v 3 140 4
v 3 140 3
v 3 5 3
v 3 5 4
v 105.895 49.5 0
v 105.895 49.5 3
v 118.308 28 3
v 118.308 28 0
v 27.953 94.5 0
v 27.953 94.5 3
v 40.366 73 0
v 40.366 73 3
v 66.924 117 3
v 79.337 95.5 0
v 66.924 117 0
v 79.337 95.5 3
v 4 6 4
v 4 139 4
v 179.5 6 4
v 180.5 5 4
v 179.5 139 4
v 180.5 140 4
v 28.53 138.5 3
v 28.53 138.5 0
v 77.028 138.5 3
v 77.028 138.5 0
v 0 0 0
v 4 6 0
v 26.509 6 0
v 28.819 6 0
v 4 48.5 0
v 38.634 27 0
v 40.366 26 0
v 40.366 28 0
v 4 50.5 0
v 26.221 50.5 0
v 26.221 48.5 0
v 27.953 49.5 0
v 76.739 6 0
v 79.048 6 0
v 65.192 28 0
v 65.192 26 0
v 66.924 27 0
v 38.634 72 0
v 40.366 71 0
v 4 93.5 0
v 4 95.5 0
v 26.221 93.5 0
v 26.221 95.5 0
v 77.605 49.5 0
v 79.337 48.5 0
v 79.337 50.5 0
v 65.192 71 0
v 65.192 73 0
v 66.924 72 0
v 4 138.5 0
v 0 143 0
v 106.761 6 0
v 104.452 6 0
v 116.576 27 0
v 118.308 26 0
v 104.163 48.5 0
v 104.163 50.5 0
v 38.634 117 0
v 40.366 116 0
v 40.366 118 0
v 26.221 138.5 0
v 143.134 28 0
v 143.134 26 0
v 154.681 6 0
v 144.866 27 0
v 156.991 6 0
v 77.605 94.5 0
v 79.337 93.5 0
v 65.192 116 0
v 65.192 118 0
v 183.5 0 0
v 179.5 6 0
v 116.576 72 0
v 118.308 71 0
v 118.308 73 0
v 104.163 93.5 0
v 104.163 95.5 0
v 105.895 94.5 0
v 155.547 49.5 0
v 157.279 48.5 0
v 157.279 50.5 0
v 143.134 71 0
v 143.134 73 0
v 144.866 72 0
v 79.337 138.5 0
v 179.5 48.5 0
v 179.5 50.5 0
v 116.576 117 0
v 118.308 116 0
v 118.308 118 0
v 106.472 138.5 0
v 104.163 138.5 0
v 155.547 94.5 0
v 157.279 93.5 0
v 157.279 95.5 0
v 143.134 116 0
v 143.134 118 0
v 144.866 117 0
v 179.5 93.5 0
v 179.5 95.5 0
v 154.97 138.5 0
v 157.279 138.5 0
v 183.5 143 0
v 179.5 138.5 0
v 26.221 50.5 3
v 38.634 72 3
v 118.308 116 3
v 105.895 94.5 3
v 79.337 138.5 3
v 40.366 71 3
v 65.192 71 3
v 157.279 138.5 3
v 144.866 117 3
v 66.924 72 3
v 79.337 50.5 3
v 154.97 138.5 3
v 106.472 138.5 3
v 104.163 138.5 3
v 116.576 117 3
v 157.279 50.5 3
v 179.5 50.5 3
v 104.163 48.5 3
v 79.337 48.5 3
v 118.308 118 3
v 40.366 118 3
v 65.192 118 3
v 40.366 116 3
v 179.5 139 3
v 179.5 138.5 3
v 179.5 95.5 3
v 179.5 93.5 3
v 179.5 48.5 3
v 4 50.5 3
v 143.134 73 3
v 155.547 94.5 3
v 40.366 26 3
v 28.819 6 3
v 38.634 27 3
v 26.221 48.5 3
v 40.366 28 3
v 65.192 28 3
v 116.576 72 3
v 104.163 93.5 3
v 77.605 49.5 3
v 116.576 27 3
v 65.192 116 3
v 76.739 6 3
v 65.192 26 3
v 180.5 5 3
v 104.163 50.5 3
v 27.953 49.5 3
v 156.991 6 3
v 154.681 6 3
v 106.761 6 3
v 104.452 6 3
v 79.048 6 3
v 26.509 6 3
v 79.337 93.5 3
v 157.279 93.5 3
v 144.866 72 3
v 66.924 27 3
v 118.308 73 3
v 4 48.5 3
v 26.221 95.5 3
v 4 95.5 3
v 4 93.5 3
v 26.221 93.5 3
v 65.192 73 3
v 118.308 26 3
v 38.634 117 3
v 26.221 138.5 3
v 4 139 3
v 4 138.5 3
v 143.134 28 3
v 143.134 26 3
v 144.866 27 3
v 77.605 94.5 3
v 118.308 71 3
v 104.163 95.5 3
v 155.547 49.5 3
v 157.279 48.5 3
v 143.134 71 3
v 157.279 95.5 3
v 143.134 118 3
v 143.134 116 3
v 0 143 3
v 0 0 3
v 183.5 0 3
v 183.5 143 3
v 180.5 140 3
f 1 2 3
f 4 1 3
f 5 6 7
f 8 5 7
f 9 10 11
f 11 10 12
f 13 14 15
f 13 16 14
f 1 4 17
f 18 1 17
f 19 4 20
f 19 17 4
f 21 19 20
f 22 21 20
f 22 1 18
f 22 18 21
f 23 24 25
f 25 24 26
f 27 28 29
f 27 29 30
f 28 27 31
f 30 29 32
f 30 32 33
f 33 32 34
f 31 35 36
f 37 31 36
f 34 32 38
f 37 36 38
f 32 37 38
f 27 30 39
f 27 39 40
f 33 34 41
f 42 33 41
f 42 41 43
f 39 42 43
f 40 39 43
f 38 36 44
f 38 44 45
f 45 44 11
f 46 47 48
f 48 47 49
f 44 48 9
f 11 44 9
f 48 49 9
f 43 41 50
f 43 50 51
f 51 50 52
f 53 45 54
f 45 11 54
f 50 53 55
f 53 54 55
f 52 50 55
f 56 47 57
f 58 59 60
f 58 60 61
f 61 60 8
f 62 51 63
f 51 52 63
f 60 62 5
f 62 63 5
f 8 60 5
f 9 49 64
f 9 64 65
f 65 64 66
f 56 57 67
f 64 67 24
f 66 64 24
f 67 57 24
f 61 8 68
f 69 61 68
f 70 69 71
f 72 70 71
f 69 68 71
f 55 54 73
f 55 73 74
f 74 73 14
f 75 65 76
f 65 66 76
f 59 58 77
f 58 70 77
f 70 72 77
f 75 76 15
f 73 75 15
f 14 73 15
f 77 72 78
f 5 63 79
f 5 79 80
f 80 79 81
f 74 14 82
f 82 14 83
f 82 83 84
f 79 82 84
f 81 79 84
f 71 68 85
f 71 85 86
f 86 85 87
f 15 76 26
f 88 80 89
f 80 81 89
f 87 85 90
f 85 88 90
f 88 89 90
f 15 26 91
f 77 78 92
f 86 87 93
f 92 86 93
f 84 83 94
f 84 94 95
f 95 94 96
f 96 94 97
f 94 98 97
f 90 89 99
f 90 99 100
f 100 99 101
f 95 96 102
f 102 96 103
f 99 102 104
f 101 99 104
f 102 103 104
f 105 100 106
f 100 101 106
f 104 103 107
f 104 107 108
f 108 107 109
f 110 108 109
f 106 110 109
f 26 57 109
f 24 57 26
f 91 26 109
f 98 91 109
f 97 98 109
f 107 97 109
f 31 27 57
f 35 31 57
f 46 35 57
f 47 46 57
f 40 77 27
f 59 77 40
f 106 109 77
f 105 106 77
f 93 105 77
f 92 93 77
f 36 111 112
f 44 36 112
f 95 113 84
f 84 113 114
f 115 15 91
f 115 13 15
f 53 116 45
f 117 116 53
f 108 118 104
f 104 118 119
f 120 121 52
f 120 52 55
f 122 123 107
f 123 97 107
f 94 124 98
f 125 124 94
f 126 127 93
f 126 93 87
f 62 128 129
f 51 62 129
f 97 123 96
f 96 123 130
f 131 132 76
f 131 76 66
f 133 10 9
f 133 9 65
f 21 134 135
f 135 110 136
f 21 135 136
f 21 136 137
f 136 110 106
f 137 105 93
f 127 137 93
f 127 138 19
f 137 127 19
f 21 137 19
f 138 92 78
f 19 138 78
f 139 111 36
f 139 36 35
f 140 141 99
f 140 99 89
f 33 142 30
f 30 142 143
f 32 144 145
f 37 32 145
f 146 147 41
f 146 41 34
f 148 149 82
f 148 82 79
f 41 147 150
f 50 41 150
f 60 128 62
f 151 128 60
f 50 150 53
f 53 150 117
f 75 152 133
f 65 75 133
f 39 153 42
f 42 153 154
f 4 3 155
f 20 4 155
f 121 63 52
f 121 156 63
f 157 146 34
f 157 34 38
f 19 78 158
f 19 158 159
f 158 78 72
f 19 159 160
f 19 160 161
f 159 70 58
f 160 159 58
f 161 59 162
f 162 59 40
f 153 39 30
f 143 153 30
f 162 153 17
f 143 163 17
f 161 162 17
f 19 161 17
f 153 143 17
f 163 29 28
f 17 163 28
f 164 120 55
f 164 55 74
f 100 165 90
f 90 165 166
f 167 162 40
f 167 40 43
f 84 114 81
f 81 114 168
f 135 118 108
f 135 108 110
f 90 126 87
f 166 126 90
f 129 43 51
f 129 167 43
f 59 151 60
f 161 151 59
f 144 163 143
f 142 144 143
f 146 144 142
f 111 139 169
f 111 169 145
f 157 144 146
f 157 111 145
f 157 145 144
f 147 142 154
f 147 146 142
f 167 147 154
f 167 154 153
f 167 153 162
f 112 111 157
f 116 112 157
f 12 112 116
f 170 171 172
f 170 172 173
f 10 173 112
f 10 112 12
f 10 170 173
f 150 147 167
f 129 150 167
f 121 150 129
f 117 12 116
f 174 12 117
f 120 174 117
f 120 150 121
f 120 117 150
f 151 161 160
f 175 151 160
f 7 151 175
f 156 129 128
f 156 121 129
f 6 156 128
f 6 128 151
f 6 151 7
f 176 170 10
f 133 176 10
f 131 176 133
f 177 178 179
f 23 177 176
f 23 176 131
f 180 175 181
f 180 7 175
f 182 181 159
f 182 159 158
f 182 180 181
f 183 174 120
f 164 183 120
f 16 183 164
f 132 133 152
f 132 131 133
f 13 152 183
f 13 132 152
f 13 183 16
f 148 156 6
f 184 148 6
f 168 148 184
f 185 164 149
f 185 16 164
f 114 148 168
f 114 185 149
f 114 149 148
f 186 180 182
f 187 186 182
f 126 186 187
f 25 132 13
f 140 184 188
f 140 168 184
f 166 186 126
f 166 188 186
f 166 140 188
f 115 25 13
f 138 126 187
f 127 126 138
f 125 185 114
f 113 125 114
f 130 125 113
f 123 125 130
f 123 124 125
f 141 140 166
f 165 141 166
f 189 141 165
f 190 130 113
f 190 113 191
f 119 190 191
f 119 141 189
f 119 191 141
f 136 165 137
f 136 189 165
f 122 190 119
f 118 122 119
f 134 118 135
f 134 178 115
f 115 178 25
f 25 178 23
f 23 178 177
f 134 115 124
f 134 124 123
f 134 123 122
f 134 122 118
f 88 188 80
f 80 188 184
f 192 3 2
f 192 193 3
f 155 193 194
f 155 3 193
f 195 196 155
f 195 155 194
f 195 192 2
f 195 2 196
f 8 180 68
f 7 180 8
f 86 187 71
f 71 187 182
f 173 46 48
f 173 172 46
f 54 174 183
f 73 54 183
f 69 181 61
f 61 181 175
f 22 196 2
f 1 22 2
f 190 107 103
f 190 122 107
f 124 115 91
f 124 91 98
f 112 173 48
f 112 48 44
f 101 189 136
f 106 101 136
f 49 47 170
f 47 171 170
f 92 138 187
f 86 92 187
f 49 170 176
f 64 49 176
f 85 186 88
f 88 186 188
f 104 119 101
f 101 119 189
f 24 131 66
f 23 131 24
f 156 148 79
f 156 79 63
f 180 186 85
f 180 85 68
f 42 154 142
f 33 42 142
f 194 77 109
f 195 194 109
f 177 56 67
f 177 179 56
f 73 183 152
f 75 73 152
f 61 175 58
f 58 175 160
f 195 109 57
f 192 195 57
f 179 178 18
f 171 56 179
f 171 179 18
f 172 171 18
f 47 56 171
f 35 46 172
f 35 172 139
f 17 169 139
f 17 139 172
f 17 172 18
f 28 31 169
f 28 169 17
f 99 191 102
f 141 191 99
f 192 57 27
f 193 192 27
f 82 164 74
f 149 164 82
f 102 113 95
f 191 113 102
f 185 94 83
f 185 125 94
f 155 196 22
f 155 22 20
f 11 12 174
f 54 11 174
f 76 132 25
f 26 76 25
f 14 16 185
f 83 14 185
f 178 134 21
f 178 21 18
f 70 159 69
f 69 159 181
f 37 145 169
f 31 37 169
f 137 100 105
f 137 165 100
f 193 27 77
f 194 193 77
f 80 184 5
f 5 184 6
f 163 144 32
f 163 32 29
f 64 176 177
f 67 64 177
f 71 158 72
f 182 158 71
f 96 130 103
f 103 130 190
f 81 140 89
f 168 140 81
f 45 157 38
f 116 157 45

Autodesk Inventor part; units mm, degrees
ref_plane "YZ Plane" through (0, 0, 0) normal (1, 0, 0) x (0, 1, 0)
ref_plane "XZ Plane" through (0, 0, 0) normal (0, 1, 0) x (-1, 0, 0)
ref_plane "XY Plane" through (0, 0, 0) normal (0, 0, 1) x (1, 0, 0)
sketch "Sketch1" plane through (0, 0, 0) normal (0, 0, 1) x (1, 0, 0)
  line L0 (0, 0) -> (183.5, 0)
  line L1 (183.5, 0) -> (183.5, 143)
  line L2 (183.5, 143) -> (0, 143)
  line L3 (0, 143) -> (0, 0)
  dimension "d0" = 183.5
  dimension "d1" = 143
extrude "Extrusion1" add sketch "Sketch1" along normal blind 3
sketch "Sketch12" plane through (0, 0, 3) normal (0, 0, 1) x (1, 0, 0)
  line L0 (0, 0) -> (183.5, 0) projected
  line L1 (183.5, 0) -> (183.5, 143) projected
  line L2 (183.5, 143) -> (0, 143) projected
  line L3 (0, 143) -> (0, 0) projected
  line L4 (3, 5) -> (4, 5)
  line L5 (4, 5) -> (4, 140)
  line L6 (4, 140) -> (3, 140)
  line L7 (3, 140) -> (3, 5)
  line L8 (4, 140) -> (179.5, 140)
  line L9 (179.5, 140) -> (179.5, 139)
  line L10 (179.5, 139) -> (4, 139)
  line L11 (4, 139) -> (4, 140)
  line L12 (179.5, 140) -> (180.5, 140)
  line L13 (180.5, 140) -> (180.5, 5)
  line L14 (180.5, 5) -> (179.5, 5)
  line L15 (179.5, 5) -> (179.5, 140)
  dimension "d77" = 3
  dimension "d78" = 1
  dimension "d79" = 5
  dimension "d80" = 3
  dimension "d81" = 1
  dimension "d82" = 3
  dimension "d83" = 1
extrude "Extrusion7" add sketch "Sketch12" along normal blind 1 contours L7 L6 L5 L4 | L5 L8 L9 L10 | L9 L12 L13 L14 L15
sketch "Sketch13" plane through (0, 0, 3) normal (0, 0, 1) x (1, 0, 0)
  line L0 (4, 139) -> (179.5, 139)
  line L1 (179.5, 139) -> (179.5, 5)
  line L2 (179.5, 5) -> (4, 5)
  line L3 (4, 5) -> (4, 139)
  line L4 (91.75, 139) -> (91.75, 5) construction
  line L5 (179.5, 72) -> (4, 72) construction
  line L6 (104.163, 50.5) -> (79.337, 50.5)
  line L7 (79.337, 50.5) -> (66.9239, 72)
  line L8 (66.9239, 72) -> (79.337, 93.5)
  line L9 (79.337, 93.5) -> (104.163, 93.5)
  line L10 (104.163, 93.5) -> (116.5761, 72)
  line L11 (116.5761, 72) -> (104.163, 50.5)
  line L12 (105.3177, 48.5) -> (78.1823, 48.5)
  line L13 (78.1823, 48.5) -> (64.6145, 72)
  line L14 (64.6145, 72) -> (78.1823, 95.5)
  line L15 (78.1823, 95.5) -> (105.3177, 95.5)
  line L16 (105.3177, 95.5) -> (118.8855, 72)
  line L17 (118.8855, 72) -> (105.3177, 48.5)
  line L18 (4, 139) -> (179.5, 139) projected
  line L19 (105.3177, 93.5) -> (78.1823, 93.5)
  line L20 (78.1823, 93.5) -> (64.6145, 117)
  line L21 (64.6145, 117) -> (78.1823, 140.5)
  line L22 (78.1823, 140.5) -> (105.3177, 140.5)
  line L23 (105.3177, 140.5) -> (118.8855, 117)
  line L24 (118.8855, 117) -> (105.3177, 93.5)
  line L25 (104.163, 95.5) -> (79.337, 95.5)
  line L26 (79.337, 95.5) -> (66.9239, 117)
  line L27 (66.9239, 117) -> (79.337, 138.5)
  line L28 (79.337, 138.5) -> (104.163, 138.5)
  line L29 (104.163, 138.5) -> (116.5761, 117)
  line L30 (116.5761, 117) -> (104.163, 95.5)
  line L31 (104.163, 5.5) -> (79.337, 5.5)
  line L32 (79.337, 5.5) -> (66.9239, 27)
  line L33 (66.9239, 27) -> (79.337, 48.5)
  line L34 (79.337, 48.5) -> (104.163, 48.5)
  line L35 (104.163, 48.5) -> (116.5761, 27)
  line L36 (116.5761, 27) -> (104.163, 5.5)
  line L37 (105.3177, 3.5) -> (78.1823, 3.5)
  line L38 (78.1823, 3.5) -> (64.6145, 27)
  line L39 (64.6145, 27) -> (78.1823, 50.5)
  line L40 (78.1823, 50.5) -> (105.3177, 50.5)
  line L41 (105.3177, 50.5) -> (118.8855, 27)
  line L42 (118.8855, 27) -> (105.3177, 3.5)
  line L43 (143.1342, 73) -> (118.3081, 73)
  line L44 (118.3081, 73) -> (105.8951, 94.5)
  line L45 (105.8951, 94.5) -> (118.3081, 116)
  line L46 (118.3081, 116) -> (143.1342, 116)
  line L47 (143.1342, 116) -> (155.5472, 94.5)
  line L48 (155.5472, 94.5) -> (143.1342, 73)
  line L49 (144.2889, 71) -> (117.1534, 71)
  line L50 (117.1534, 71) -> (103.5857, 94.5)
  line L51 (103.5857, 94.5) -> (117.1534, 118)
  line L52 (117.1534, 118) -> (144.2889, 118)
  line L53 (144.2889, 118) -> (157.8566, 94.5)
  line L54 (157.8566, 94.5) -> (144.2889, 71)
  line L55 (39.2111, 163) -> (66.3466, 163)
  line L56 (40.3658, 161) -> (65.1919, 161)
  line L57 (25.6434, 139.5) -> (39.2111, 163)
  line L58 (27.9528, 139.5) -> (40.3658, 161)
  line L59 (40.3658, 118) -> (27.9528, 139.5)
  line L60 (39.2111, 116) -> (25.6434, 139.5)
  line L61 (66.3466, 116) -> (39.2111, 116)
  line L62 (65.1919, 161) -> (77.6049, 139.5)
  line L63 (66.3466, 163) -> (79.9143, 139.5)
  line L64 (77.6049, 139.5) -> (65.1919, 118)
  line L65 (79.9143, 139.5) -> (66.3466, 116)
  line L66 (65.1919, 118) -> (40.3658, 118)
  line L67 (142.5568, 72) -> (156.1246, 95.5)
  line L68 (156.1246, 48.5) -> (142.5568, 72)
  line L69 (157.2793, 50.5) -> (144.8662, 72)
  line L70 (144.8662, 72) -> (157.2793, 93.5)
  line L71 (157.2793, 93.5) -> (182.1053, 93.5)
  line L72 (182.1053, 50.5) -> (157.2793, 50.5)
  line L73 (183.26, 48.5) -> (156.1246, 48.5)
  line L74 (156.1246, 95.5) -> (183.26, 95.5)
  line L75 (194.5183, 72) -> (182.1053, 50.5)
  line L76 (196.8277, 72) -> (183.26, 48.5)
  line L77 (182.1053, 93.5) -> (194.5183, 72)
  line L78 (183.26, 95.5) -> (196.8277, 72)
  line L79 (25.6434, 49.5) -> (39.2111, 73)
  line L80 (39.2111, 26) -> (25.6434, 49.5)
  line L81 (40.3658, 28) -> (27.9528, 49.5)
  line L82 (27.9528, 49.5) -> (40.3658, 71)
  line L83 (40.3658, 71) -> (65.1919, 71)
  line L84 (65.1919, 28) -> (40.3658, 28)
  line L85 (66.3466, 26) -> (39.2111, 26)
  line L86 (39.2111, 73) -> (66.3466, 73)
  line L87 (77.6049, 49.5) -> (65.1919, 28)
  line L88 (79.9143, 49.5) -> (66.3466, 26)
  line L89 (65.1919, 71) -> (77.6049, 49.5)
  line L90 (66.3466, 73) -> (79.9143, 49.5)
  line L91 (-13.3277, 72) -> (0.24, 95.5)
  line L92 (-11.0183, 72) -> (1.3947, 93.5)
  line L93 (0.24, 48.5) -> (-13.3277, 72)
  line L94 (1.3947, 50.5) -> (-11.0183, 72)
  line L95 (1.3947, 93.5) -> (26.2207, 93.5)
  line L96 (26.2207, 50.5) -> (1.3947, 50.5)
  line L97 (27.3754, 48.5) -> (0.24, 48.5)
  line L98 (0.24, 95.5) -> (27.3754, 95.5)
  line L99 (38.6338, 72) -> (26.2207, 50.5)
  line L100 (40.9432, 72) -> (27.3754, 48.5)
  line L101 (26.2207, 93.5) -> (38.6338, 72)
  line L102 (27.3754, 95.5) -> (40.9432, 72)
  line L103 (25.6434, 94.5) -> (39.2111, 118)
  line L104 (39.2111, 71) -> (25.6434, 94.5)
  line L105 (40.3658, 73) -> (27.9528, 94.5)
  line L106 (27.9528, 94.5) -> (40.3658, 116)
  line L107 (40.3658, 116) -> (65.1919, 116)
  line L108 (65.1919, 73) -> (40.3658, 73)
  line L109 (66.3466, 71) -> (39.2111, 71)
  line L110 (39.2111, 118) -> (66.3466, 118)
  line L111 (77.6049, 94.5) -> (65.1919, 73)
  line L112 (79.9143, 94.5) -> (66.3466, 71)
  line L113 (65.1919, 116) -> (77.6049, 94.5)
  line L114 (66.3466, 118) -> (79.9143, 94.5)
  line L115 (117.1534, 26) -> (103.5857, 49.5)
  line L116 (118.3081, 28) -> (105.8951, 49.5)
  line L117 (105.8951, 49.5) -> (118.3081, 71)
  line L118 (143.1342, 28) -> (118.3081, 28)
  line L119 (144.2889, 26) -> (117.1534, 26)
  line L120 (155.5472, 49.5) -> (143.1342, 28)
  line L121 (157.8566, 49.5) -> (144.2889, 26)
  line L122 (118.3081, 71) -> (143.1342, 71)
  line L123 (117.1534, 73) -> (144.2889, 73)
  line L124 (143.1342, 71) -> (155.5472, 49.5)
  line L125 (103.5857, 49.5) -> (117.1534, 73)
  line L126 (144.2889, 73) -> (157.8566, 49.5)
  line L127 (-13.3277, 117) -> (0.24, 140.5)
  line L128 (0.24, 93.5) -> (-13.3277, 117)
  line L129 (1.3947, 95.5) -> (-11.0183, 117)
  line L130 (-11.0183, 117) -> (1.3947, 138.5)
  line L131 (1.3947, 138.5) -> (26.2207, 138.5)
  line L132 (26.2207, 95.5) -> (1.3947, 95.5)
  line L133 (27.3754, 93.5) -> (0.24, 93.5)
  line L134 (0.24, 140.5) -> (27.3754, 140.5)
  line L135 (38.6338, 117) -> (26.2207, 95.5)
  line L136 (40.9432, 117) -> (27.3754, 93.5)
  line L137 (26.2207, 138.5) -> (38.6338, 117)
  line L138 (27.3754, 140.5) -> (40.9432, 117)
  line L139 (103.5857, 139.5) -> (117.1534, 163)
  line L140 (117.1534, 116) -> (103.5857, 139.5)
  line L141 (118.3081, 118) -> (105.8951, 139.5)
  line L142 (105.8951, 139.5) -> (118.3081, 161)
  line L143 (118.3081, 161) -> (143.1342, 161)
  line L144 (143.1342, 118) -> (118.3081, 118)
  line L145 (144.2889, 116) -> (117.1534, 116)
  line L146 (117.1534, 163) -> (144.2889, 163)
  line L147 (155.5472, 139.5) -> (143.1342, 118)
  line L148 (157.8566, 139.5) -> (144.2889, 116)
  line L149 (143.1342, 161) -> (155.5472, 139.5)
  line L150 (144.2889, 163) -> (157.8566, 139.5)
  line L151 (142.5568, 27) -> (156.1246, 50.5)
  line L152 (156.1246, 3.5) -> (142.5568, 27)
  line L153 (157.2793, 5.5) -> (144.8662, 27)
  line L154 (144.8662, 27) -> (157.2793, 48.5)
  line L155 (157.2793, 48.5) -> (182.1053, 48.5)
  line L156 (182.1053, 5.5) -> (157.2793, 5.5)
  line L157 (183.26, 3.5) -> (156.1246, 3.5)
  line L158 (194.5183, 27) -> (182.1053, 5.5)
  line L159 (196.8277, 27) -> (183.26, 3.5)
  line L160 (156.1246, 50.5) -> (183.26, 50.5)
  line L161 (182.1053, 48.5) -> (194.5183, 27)
  line L162 (183.26, 50.5) -> (196.8277, 27)
  line L163 (142.5568, 117) -> (156.1246, 140.5)
  line L164 (156.1246, 93.5) -> (142.5568, 117)
  line L165 (157.2793, 95.5) -> (144.8662, 117)
  line L166 (144.8662, 117) -> (157.2793, 138.5)
  line L167 (157.2793, 138.5) -> (182.1053, 138.5)
  line L168 (182.1053, 95.5) -> (157.2793, 95.5)
  line L169 (183.26, 93.5) -> (156.1246, 93.5)
  line L170 (194.5183, 117) -> (182.1053, 95.5)
  line L171 (196.8277, 117) -> (183.26, 93.5)
  line L172 (156.1246, 140.5) -> (183.26, 140.5)
  line L173 (182.1053, 138.5) -> (194.5183, 117)
  line L174 (183.26, 140.5) -> (196.8277, 117)
  line L175 (103.5857, 4.5) -> (117.1534, 28)
  line L176 (118.3081, 26) -> (143.1342, 26)
  line L177 (105.8951, 4.5) -> (118.3081, 26)
  line L178 (118.3081, -17) -> (105.8951, 4.5)
  line L179 (117.1534, -19) -> (103.5857, 4.5)
  line L180 (143.1342, 26) -> (155.5472, 4.5)
  line L181 (144.2889, 28) -> (157.8566, 4.5)
  line L182 (143.1342, -17) -> (118.3081, -17)
  line L183 (155.5472, 4.5) -> (143.1342, -17)
  line L184 (157.8566, 4.5) -> (144.2889, -19)
  line L185 (144.2889, -19) -> (117.1534, -19)
  line L186 (117.1534, 28) -> (144.2889, 28)
  line L187 (-13.3277, 27) -> (0.24, 50.5)
  line L188 (0.24, 3.5) -> (-13.3277, 27)
  line L189 (1.3947, 5.5) -> (-11.0183, 27)
  line L190 (-11.0183, 27) -> (1.3947, 48.5)
  line L191 (1.3947, 48.5) -> (26.2207, 48.5)
  line L192 (26.2207, 5.5) -> (1.3947, 5.5)
  line L193 (27.3754, 3.5) -> (0.24, 3.5)
  line L194 (0.24, 50.5) -> (27.3754, 50.5)
  line L195 (38.6338, 27) -> (26.2207, 5.5)
  line L196 (40.9432, 27) -> (27.3754, 3.5)
  line L197 (26.2207, 48.5) -> (38.6338, 27)
  line L198 (27.3754, 50.5) -> (40.9432, 27)
  line L199 (25.6434, 4.5) -> (39.2111, 28)
  line L200 (39.2111, -19) -> (25.6434, 4.5)
  line L201 (40.3658, -17) -> (27.9528, 4.5)
  line L202 (27.9528, 4.5) -> (40.3658, 26)
  line L203 (40.3658, 26) -> (65.1919, 26)
  line L204 (65.1919, -17) -> (40.3658, -17)
  line L205 (66.3466, -19) -> (39.2111, -19)
  line L206 (77.6049, 4.5) -> (65.1919, -17)
  line L207 (79.9143, 4.5) -> (66.3466, -19)
  line L208 (39.2111, 28) -> (66.3466, 28)
  line L209 (65.1919, 26) -> (77.6049, 4.5)
  line L210 (66.3466, 28) -> (79.9143, 4.5)
  point P0 (91.75, 72)
  point P1 (91.75, 72)
  point P2 (91.75, 117)
  point P3 (91.75, 117)
  point P4 (91.75, 27)
  point P5 (91.75, 27)
  point P6 (130.7211, 94.5)
  point P7 (130.7211, 94.5)
  point P8 (52.7789, 139.5)
  point P9 (52.7789, 139.5)
  point P10 (169.6923, 72)
  point P11 (169.6923, 72)
  point P12 (52.7789, 49.5)
  point P13 (52.7789, 49.5)
  point P14 (13.8077, 72)
  point P15 (13.8077, 72)
  point P16 (52.7789, 94.5)
  point P17 (52.7789, 94.5)
  point P18 (130.7211, 49.5)
  point P19 (130.7211, 49.5)
  point P20 (13.8077, 117)
  point P21 (13.8077, 117)
  point P22 (130.7211, 139.5)
  point P23 (130.7211, 139.5)
  point P24 (169.6923, 27)
  point P25 (169.6923, 27)
  point P26 (169.6923, 117)
  point P27 (169.6923, 117)
  point P28 (130.7211, 4.5)
  point P29 (130.7211, 4.5)
  point P30 (13.8077, 27)
  point P31 (13.8077, 27)
  point P32 (52.7789, 4.5)
  point P33 (52.7789, 4.5)
  dimension "d86" = 2
  dimension "d88" = 43
  dimension "d89" = 2
  dimension "d90" = 43
  dimension "d93" = 43
  dimension "d94" = 2
  dimension "d95" = 43
  dimension "d96" = 2
  dimension "d97" = 43
  dimension "d98" = 2
  dimension "d99" = 43
  dimension "d100" = 2
  dimension "d101" = 43
  dimension "d102" = 2
  dimension "d103" = 43
  dimension "d104" = 2
  dimension "d105" = 43
  dimension "d106" = 2
  dimension "d107" = 43
  dimension "d108" = 2
  dimension "d109" = 43
  dimension "d110" = 2
  dimension "d111" = 43
  dimension "d112" = 2
  dimension "d113" = 43
  dimension "d114" = 2
  dimension "d115" = 43
  dimension "d116" = 2
  dimension "d117" = 43
  dimension "d118" = 2
  dimension "d119" = 43
  dimension "d120" = 2
  dimension "d121" = 43
  dimension "d122" = 2
extrude "Extrusion9" cut sketch "Sketch13" against normal blind 10 contours L131 L60 L103 L98 L3 | L3 L98 L129 L130 L131 | L59 L58 L56 L62 L21 L0 | L0 L21 L66 L59 | L95 L101 L79 L96 L3 | L3 L96 L94 L92 L95 | L28 L29 L30 L15 L26 L27 | L61 L20 L14 L86 L102 L106 | L97 L80 L195 L192 L3 | L3 L192 L189 L190 L97 | L23 L142 L143 L149 L147 L0 | L0 L147 L52 L23 | L82 L83 L13 L39 L84 L81 | L167 L1 L74 L53 L148 | L46 L47 L48 L43 L16 L24 | L9 L10 L11 L6 L7 L8 | L196 L85 L38 L2 | L2 L38 L206 L204 L201 L196 | L167 L173 L170 L74 L1 | L33 L12 L35 L36 L31 L32 | L71 L77 L75 L72 L1 | L1 L72 L69 L54 L71 | L49 L68 L120 L118 L41 L17 | L42 L119 L152 L2 | L2 L152 L183 L182 L178 L42 | L73 L161 L158 L156 L1 | L1 L156 L153 L121 L73
sketch "Sketch15" plane through (0, 0, 0) normal (0, 0, -1) x (-1, 0, 0)
  line L0 (-152.9491, 0) -> (-183.5, 0) projected
  line L1 (0, 0) -> (-30.5509, 0) projected
  line L2 (-183.5, 143) -> (-179.5, 143)
  line L3 (-179.5, 143) -> (-179.5, 0)
  line L4 (-179.5, 0) -> (-183.5, 0)
  line L5 (-183.5, 0) -> (-183.5, 143)
  line L6 (0, 143) -> (-4, 143)
  line L7 (-4, 143) -> (-4, 0)
  line L8 (-4, 0) -> (0, 0)
  line L9 (0, 0) -> (0, 143)
  line L10 (-179.5, 143) -> (-4, 143)
  line L11 (-4, 143) -> (-4, 138.5)
  line L12 (-4, 138.5) -> (-179.5, 138.5)
  line L13 (-179.5, 138.5) -> (-179.5, 143)
  line L14 (-179.5, 0) -> (-4, 0)
  line L15 (-4, 0) -> (-4, 6)
  line L16 (-4, 6) -> (-179.5, 6)
  line L17 (-179.5, 6) -> (-179.5, 0)
  dimension "d129" = 4.5
  dimension "d130" = 4
  dimension "d131" = 4
  dimension "d132" = 6
extrude "Extrusion10" add sketch "Sketch15" against normal blind 3 contours L0 L3 L16 L7 L1 L14 | L0 L5 L2 L3 | L7 L6 L9 L1 | L3 L10 L7 L12
sketch "Sketch16" plane through (0, 0, 3) normal (0, 0, 1) x (1, 0, 0)
  line L0 (4, 5) -> (179.5, 5)
  line L1 (179.5, 5) -> (179.5, 6)
  line L2 (179.5, 6) -> (4, 6)
  line L3 (4, 6) -> (4, 5)
extrude "Extrusion11" add sketch "Sketch16" along normal blind 1
properties part number "plate" material "ABS Plastic"
